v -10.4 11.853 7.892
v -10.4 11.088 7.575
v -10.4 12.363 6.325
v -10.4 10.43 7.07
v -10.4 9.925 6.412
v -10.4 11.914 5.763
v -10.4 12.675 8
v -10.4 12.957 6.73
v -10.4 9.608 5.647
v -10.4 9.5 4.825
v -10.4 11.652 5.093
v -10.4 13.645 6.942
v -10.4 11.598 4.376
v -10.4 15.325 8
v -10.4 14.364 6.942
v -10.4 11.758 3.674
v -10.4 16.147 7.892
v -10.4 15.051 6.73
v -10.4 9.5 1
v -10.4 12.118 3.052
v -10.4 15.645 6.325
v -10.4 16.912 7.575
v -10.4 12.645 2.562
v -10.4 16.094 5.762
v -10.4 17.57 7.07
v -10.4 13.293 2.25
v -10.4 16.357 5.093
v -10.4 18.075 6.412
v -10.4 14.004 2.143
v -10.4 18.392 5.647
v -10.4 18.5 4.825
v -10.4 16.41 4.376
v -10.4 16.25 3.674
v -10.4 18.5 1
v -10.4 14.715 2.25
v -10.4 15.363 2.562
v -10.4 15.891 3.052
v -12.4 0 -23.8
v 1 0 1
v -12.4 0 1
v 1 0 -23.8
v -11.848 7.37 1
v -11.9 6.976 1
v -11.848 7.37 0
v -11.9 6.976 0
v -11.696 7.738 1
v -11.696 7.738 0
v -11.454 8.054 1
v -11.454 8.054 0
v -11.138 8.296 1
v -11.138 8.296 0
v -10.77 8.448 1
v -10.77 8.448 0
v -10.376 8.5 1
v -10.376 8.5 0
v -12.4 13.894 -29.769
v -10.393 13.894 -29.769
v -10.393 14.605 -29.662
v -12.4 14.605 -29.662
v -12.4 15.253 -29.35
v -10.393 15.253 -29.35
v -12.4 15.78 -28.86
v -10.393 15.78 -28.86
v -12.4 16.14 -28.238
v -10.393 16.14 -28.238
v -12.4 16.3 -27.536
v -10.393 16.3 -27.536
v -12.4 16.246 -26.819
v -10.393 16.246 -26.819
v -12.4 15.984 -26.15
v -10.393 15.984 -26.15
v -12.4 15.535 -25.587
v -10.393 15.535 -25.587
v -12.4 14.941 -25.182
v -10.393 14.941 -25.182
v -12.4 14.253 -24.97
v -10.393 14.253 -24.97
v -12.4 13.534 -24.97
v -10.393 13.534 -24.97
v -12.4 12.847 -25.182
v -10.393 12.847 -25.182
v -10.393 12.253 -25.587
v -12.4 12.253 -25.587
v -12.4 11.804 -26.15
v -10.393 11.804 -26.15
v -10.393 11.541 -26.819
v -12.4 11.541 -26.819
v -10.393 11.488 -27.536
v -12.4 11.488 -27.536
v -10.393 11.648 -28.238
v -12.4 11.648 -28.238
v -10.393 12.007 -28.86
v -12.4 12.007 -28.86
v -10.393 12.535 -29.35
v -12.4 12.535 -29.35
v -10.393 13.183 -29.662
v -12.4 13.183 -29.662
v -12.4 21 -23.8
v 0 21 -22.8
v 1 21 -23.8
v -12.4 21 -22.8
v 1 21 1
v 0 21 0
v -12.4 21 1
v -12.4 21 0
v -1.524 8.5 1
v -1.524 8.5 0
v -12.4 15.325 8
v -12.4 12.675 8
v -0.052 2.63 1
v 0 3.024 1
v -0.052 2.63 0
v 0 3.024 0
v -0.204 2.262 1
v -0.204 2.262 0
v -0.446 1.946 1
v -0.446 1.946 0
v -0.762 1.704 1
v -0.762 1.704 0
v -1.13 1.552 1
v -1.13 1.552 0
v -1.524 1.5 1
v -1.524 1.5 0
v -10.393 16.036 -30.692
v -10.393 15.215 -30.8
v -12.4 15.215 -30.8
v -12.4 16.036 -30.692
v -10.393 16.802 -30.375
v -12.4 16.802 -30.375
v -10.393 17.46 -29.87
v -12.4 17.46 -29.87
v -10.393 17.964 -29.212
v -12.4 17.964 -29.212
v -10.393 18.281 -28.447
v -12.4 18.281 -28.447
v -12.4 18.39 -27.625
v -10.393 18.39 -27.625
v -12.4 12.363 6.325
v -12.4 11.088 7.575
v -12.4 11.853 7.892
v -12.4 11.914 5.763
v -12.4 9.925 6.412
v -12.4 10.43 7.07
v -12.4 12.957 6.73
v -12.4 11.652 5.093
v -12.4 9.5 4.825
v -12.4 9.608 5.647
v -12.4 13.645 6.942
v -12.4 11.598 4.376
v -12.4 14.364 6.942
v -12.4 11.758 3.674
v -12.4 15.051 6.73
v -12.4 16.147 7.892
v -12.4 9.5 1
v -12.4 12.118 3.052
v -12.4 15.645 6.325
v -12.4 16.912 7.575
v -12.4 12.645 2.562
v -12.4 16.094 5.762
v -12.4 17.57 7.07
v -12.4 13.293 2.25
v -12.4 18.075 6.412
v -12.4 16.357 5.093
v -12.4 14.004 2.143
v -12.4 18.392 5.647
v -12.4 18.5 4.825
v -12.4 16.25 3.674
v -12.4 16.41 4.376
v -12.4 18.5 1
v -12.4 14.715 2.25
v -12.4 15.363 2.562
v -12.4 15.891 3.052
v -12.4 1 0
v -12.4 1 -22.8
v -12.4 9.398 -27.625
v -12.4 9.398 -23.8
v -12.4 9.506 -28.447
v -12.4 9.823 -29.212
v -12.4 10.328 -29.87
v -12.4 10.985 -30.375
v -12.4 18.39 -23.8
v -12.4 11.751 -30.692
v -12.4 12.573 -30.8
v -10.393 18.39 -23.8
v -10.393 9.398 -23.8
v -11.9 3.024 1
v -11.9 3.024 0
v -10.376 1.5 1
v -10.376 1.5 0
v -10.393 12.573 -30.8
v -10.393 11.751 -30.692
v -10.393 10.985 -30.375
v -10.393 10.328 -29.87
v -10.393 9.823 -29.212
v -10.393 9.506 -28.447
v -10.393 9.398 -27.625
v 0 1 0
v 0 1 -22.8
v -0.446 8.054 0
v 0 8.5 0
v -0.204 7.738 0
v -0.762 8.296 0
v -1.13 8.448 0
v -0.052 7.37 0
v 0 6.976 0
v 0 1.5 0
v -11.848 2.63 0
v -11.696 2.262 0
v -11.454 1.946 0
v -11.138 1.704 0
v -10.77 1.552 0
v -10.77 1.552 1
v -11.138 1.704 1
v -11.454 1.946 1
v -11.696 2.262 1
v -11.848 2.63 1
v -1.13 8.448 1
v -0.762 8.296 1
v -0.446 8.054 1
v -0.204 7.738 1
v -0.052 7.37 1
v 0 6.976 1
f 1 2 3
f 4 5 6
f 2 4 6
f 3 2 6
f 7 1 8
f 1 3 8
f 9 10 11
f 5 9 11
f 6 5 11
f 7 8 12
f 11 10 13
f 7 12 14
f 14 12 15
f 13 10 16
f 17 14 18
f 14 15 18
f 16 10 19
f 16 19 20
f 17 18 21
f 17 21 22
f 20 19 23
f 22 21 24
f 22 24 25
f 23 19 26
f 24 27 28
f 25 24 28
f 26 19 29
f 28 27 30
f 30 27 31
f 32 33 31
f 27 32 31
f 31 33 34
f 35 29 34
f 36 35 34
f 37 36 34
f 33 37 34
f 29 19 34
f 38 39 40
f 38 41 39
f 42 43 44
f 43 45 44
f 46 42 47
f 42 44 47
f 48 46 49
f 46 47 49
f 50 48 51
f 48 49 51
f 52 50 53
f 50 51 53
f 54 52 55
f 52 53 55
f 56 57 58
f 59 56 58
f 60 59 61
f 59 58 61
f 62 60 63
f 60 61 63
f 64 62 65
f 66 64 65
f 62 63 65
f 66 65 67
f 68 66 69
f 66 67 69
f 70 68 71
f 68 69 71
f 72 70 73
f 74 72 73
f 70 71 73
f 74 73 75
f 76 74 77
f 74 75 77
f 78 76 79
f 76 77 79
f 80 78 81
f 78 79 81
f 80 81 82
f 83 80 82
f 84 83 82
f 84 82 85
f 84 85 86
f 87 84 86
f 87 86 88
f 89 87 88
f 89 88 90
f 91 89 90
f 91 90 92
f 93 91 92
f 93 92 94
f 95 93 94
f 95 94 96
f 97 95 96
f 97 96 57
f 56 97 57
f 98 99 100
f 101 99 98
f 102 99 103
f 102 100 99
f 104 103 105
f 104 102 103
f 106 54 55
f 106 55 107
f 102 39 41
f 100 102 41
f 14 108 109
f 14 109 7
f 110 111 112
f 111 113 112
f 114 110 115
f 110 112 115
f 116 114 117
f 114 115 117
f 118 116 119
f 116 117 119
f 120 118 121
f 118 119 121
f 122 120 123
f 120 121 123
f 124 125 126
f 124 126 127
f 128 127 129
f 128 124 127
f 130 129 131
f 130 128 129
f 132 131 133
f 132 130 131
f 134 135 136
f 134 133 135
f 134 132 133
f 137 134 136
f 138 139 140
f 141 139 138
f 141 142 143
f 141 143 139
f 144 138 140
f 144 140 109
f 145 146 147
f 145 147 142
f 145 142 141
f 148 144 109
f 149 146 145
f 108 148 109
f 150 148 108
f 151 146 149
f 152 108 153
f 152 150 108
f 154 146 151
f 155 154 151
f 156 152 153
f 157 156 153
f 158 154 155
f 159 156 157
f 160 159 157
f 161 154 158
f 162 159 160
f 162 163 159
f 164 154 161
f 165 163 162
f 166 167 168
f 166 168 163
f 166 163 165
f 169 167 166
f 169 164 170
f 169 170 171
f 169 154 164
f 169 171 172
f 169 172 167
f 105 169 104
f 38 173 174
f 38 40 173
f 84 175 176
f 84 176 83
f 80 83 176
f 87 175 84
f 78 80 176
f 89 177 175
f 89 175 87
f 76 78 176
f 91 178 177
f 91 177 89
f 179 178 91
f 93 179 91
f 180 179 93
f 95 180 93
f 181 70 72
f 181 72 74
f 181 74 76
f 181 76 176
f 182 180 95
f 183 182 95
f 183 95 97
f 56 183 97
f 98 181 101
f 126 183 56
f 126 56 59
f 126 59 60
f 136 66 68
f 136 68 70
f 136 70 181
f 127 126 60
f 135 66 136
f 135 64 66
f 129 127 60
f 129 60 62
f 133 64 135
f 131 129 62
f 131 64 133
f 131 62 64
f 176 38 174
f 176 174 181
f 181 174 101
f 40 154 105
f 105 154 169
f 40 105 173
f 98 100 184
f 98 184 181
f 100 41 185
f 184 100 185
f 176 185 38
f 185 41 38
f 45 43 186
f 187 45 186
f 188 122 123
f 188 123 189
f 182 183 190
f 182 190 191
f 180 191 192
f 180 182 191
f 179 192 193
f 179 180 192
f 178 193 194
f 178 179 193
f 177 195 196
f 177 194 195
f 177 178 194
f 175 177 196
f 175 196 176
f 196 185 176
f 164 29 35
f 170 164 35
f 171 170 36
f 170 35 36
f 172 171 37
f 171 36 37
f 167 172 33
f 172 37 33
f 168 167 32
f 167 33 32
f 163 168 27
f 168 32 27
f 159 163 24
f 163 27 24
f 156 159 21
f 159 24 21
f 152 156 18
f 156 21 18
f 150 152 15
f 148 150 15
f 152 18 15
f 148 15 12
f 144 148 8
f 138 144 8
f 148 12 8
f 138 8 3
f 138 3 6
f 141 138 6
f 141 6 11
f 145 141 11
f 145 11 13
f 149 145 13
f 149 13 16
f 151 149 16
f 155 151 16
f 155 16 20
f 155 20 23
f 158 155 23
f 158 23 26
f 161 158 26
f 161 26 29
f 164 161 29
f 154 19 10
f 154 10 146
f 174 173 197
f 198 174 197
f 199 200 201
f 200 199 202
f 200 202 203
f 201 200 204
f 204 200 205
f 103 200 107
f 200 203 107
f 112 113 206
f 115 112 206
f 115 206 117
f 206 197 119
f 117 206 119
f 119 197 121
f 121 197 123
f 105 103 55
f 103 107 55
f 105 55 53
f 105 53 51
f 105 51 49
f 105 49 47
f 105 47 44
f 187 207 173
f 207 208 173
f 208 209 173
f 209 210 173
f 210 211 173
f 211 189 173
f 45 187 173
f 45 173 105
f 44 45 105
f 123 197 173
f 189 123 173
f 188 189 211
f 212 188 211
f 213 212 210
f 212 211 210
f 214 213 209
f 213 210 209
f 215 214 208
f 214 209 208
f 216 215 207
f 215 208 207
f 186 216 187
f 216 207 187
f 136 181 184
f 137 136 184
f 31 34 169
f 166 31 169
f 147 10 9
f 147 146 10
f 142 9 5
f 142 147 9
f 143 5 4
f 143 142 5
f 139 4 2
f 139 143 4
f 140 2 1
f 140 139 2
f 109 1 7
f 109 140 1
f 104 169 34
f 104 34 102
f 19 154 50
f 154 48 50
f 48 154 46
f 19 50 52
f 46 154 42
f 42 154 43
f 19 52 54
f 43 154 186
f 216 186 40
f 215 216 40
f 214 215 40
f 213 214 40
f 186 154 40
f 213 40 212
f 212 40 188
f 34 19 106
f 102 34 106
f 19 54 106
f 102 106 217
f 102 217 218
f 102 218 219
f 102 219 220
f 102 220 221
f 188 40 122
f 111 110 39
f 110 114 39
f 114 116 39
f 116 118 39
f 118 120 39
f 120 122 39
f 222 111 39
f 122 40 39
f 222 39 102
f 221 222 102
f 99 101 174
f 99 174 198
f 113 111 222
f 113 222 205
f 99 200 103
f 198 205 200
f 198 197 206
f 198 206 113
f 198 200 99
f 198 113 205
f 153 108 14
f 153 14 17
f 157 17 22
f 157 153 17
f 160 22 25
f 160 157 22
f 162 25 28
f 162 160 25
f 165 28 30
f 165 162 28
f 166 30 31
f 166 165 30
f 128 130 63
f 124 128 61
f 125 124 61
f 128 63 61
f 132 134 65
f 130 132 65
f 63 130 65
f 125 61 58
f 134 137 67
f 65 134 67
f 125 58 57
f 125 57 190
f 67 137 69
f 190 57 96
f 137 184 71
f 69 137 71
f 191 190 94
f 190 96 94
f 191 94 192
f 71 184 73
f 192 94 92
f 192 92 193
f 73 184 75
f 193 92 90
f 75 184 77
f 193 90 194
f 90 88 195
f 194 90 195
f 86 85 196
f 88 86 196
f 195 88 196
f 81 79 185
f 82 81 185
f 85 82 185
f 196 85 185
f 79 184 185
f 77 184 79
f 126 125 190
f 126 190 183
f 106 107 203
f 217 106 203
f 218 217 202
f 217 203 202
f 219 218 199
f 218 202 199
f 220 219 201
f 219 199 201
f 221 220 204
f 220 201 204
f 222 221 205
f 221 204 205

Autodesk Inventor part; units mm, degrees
ref_plane "YZ Plane" through (0, 0, 0) normal (1, 0, 0) x (0, 1, 0)
ref_plane "XZ Plane" through (0, 0, 0) normal (0, 1, 0) x (-1, 0, 0)
ref_plane "XY Plane" through (0, 0, 0) normal (0, 0, 1) x (1, 0, 0)
sketch "Sketch1" plane through (0, 0, 0) normal (0, 1, 0) x (-1, 0, 0)
  line L0 (0, 0) -> (0, -22.8)
  line L1 (0, 0) -> (12.4, 0)
  line L2 (12.4, 0) -> (12.4, -22.8)
  line L3 (12.4, -22.8) -> (0, -22.8)
  line L4 (12.4, 0) -> (12.4, 1)
  line L5 (12.4, -22.8) -> (12.4, -23.8)
  line L6 (0, 0) -> (-1, 0)
  line L7 (12.4, 1) -> (-1, 1)
  line L8 (-1, 1) -> (-1, -23.8)
  line L9 (-1, -23.8) -> (12.4, -23.8)
  dimension "d0" = 22.8
  dimension "d1" = 12.4
  dimension "d2" = 1
  dimension "d3" = 1
extrude "Extrusion1" add sketch "Sketch1" along normal blind 21 contours L6 L8 L7 L4 L1 | L0 L3 L5 L9 L8 L6
sketch "Sketch2" plane through (-12.4, 0, -22.8) normal (0, 0, 1) x (1, 0, 0)
  line L0 (0, 0) -> (0, 21) projected
  line L1 (0, 0) -> (0, 1)
  line L2 (0, 1) -> (12.4, 1)
  line L3 (12.4, 0) -> (12.4, 21) projected
  line L4 (12.4, 0) -> (0, 0)
  dimension "d7" = 1
extrude "Extrusion2" add sketch "Sketch2" along normal blind 22.9
sketch "Sketch3" plane through (-12.4, 0, 1) normal (0, 0, 1) x (1, 0, 0)
  line L0 (12.4, 1) -> (0, 1) projected
  line L1 (0, 1) -> (0, 9)
  line L2 (0, 0) -> (0, 21) projected
  line L3 (0, 9) -> (13.4, 9)
  line L4 (13.4, 0) -> (13.4, 21) projected
  line L5 (13.4, 1) -> (13.4, 9)
  line L6 (13.4, 1) -> (0, 1)
  line L7 (0.5, 8.5) -> (0.5, 1.5)
  line L8 (0, 0) -> (13.4, 0) projected
  line L9 (0.5, 8.5) -> (12.9, 8.5)
  line L10 (12.4, 1) -> (12.4, 21) projected
  line L11 (12.9, 8.5) -> (12.9, 1.5)
  line L12 (12.9, 1.5) -> (0.5, 1.5)
  point P0 (12.4, 0)
  point P1 (12.4, 1.5)
  point P2 (12.4, 8.5)
  dimension "d10" = 8
extrude "Extrusion3" cut sketch "Sketch3" against normal blind 1 contours L12 L7 L9 L10
sketch "Sketch4" plane through (-12.4, 0, 1) normal (0, 0, 1) x (1, 0, 0)
  line L0 (12.4, 8.5) -> (0.5, 8.5) projected
  line L1 (2, 9.5) -> (2, 18.5)
  line L2 (2, 18.5) -> (0, 18.5)
  line L3 (0, 1) -> (0, 21) projected
  line L4 (2, 9.5) -> (0, 9.5)
  point P0 (12.4, 0)
  dimension "d20" = 9
extrude "Extrusion4" add sketch "Sketch4" along normal blind 7
sketch "Sketch5" plane through (1, 0, -23.8) normal (0, 0, -1) x (-1, 0, 0)
  line L0 (0, 0) -> (13.4, 0) projected
  line L1 (13.4, 0) -> (13.4, 9.398)
  line L2 (13.4, 0) -> (13.4, 21) projected
  line L3 (13.4, 9.398) -> (13.4, 18.3896)
  line L4 (13.4, 18.3896) -> (11.3934, 18.3896)
  line L5 (11.3934, 18.3896) -> (11.3934, 9.398)
  line L6 (11.3934, 9.398) -> (13.4, 9.398)
  point P0 (1, 0)
  dimension "d24" = 9.398
  dimension "d25" = 8.9916
  dimension "d26" = 2.0066
extrude "Extrusion5" add sketch "Sketch5" along normal blind 7
fillet "Fillet1" radius 3.175 4 edges at (-11.4, 18.5, 8) (-11.4, 9.5, 8) (-11.3967, 18.3896, -30.8) (-11.3967, 9.398, -30.8)
sketch "Sketch6" plane through (-10.4, 9.5, 1) normal (1, 0, 0) x (0, 0, -1)
  line L0 (0, 9) -> (-3.556, 9)
  line L1 (0, 9) -> (-3.825, 9) projected
  line L2 (-3.556, 9) -> (-3.556, 4.5042)
  line L3 (24.8, 8.8896) -> (28.625, 8.8896) projected
  circle A0 centre (-3.556, 4.5042) radius 2.413
  point P0 (1, -9.5)
  dimension "d33" = 3.556
  dimension "d34" = 4.4958
  dimension "d37" = 4.826
extrude "Extrusion6" cut sketch "Sketch6" against normal blind 7
thread "Thread1" size "10-24 UNC" class "2B" standard "ANSI Unified Screw Threads" full length
sketch "Sketch7" plane through (-10.3934, 9.398, -23.8) normal (1, 0, 0) x (0, 0, -1)
  line L0 (0, 8.9916) -> (3.556, 8.9916)
  line L1 (0, 8.9916) -> (3.825, 8.9916) projected
  line L2 (3.556, 8.9916) -> (3.556, 4.4958)
  circle A0 centre (3.556, 4.4958) radius 2.413
  point P0 (-23.8, -9.398)
  dimension "d42" = 3.556
  dimension "d43" = 4.4958
  dimension "d44" = 4.826
extrude "Extrusion7" cut sketch "Sketch7" against normal blind 7
thread "Thread2" size "10-24 UNC" class "2B" standard "ANSI Unified Screw Threads" full length
fillet "Fillet2" radius 1.524 4 edges at (-11.9, 8.5, 0.5) (0, 8.5, 0.5) (0, 1.5, 0.5) (-11.9, 1.5, 0.5)
properties part number "Servo Mount"
